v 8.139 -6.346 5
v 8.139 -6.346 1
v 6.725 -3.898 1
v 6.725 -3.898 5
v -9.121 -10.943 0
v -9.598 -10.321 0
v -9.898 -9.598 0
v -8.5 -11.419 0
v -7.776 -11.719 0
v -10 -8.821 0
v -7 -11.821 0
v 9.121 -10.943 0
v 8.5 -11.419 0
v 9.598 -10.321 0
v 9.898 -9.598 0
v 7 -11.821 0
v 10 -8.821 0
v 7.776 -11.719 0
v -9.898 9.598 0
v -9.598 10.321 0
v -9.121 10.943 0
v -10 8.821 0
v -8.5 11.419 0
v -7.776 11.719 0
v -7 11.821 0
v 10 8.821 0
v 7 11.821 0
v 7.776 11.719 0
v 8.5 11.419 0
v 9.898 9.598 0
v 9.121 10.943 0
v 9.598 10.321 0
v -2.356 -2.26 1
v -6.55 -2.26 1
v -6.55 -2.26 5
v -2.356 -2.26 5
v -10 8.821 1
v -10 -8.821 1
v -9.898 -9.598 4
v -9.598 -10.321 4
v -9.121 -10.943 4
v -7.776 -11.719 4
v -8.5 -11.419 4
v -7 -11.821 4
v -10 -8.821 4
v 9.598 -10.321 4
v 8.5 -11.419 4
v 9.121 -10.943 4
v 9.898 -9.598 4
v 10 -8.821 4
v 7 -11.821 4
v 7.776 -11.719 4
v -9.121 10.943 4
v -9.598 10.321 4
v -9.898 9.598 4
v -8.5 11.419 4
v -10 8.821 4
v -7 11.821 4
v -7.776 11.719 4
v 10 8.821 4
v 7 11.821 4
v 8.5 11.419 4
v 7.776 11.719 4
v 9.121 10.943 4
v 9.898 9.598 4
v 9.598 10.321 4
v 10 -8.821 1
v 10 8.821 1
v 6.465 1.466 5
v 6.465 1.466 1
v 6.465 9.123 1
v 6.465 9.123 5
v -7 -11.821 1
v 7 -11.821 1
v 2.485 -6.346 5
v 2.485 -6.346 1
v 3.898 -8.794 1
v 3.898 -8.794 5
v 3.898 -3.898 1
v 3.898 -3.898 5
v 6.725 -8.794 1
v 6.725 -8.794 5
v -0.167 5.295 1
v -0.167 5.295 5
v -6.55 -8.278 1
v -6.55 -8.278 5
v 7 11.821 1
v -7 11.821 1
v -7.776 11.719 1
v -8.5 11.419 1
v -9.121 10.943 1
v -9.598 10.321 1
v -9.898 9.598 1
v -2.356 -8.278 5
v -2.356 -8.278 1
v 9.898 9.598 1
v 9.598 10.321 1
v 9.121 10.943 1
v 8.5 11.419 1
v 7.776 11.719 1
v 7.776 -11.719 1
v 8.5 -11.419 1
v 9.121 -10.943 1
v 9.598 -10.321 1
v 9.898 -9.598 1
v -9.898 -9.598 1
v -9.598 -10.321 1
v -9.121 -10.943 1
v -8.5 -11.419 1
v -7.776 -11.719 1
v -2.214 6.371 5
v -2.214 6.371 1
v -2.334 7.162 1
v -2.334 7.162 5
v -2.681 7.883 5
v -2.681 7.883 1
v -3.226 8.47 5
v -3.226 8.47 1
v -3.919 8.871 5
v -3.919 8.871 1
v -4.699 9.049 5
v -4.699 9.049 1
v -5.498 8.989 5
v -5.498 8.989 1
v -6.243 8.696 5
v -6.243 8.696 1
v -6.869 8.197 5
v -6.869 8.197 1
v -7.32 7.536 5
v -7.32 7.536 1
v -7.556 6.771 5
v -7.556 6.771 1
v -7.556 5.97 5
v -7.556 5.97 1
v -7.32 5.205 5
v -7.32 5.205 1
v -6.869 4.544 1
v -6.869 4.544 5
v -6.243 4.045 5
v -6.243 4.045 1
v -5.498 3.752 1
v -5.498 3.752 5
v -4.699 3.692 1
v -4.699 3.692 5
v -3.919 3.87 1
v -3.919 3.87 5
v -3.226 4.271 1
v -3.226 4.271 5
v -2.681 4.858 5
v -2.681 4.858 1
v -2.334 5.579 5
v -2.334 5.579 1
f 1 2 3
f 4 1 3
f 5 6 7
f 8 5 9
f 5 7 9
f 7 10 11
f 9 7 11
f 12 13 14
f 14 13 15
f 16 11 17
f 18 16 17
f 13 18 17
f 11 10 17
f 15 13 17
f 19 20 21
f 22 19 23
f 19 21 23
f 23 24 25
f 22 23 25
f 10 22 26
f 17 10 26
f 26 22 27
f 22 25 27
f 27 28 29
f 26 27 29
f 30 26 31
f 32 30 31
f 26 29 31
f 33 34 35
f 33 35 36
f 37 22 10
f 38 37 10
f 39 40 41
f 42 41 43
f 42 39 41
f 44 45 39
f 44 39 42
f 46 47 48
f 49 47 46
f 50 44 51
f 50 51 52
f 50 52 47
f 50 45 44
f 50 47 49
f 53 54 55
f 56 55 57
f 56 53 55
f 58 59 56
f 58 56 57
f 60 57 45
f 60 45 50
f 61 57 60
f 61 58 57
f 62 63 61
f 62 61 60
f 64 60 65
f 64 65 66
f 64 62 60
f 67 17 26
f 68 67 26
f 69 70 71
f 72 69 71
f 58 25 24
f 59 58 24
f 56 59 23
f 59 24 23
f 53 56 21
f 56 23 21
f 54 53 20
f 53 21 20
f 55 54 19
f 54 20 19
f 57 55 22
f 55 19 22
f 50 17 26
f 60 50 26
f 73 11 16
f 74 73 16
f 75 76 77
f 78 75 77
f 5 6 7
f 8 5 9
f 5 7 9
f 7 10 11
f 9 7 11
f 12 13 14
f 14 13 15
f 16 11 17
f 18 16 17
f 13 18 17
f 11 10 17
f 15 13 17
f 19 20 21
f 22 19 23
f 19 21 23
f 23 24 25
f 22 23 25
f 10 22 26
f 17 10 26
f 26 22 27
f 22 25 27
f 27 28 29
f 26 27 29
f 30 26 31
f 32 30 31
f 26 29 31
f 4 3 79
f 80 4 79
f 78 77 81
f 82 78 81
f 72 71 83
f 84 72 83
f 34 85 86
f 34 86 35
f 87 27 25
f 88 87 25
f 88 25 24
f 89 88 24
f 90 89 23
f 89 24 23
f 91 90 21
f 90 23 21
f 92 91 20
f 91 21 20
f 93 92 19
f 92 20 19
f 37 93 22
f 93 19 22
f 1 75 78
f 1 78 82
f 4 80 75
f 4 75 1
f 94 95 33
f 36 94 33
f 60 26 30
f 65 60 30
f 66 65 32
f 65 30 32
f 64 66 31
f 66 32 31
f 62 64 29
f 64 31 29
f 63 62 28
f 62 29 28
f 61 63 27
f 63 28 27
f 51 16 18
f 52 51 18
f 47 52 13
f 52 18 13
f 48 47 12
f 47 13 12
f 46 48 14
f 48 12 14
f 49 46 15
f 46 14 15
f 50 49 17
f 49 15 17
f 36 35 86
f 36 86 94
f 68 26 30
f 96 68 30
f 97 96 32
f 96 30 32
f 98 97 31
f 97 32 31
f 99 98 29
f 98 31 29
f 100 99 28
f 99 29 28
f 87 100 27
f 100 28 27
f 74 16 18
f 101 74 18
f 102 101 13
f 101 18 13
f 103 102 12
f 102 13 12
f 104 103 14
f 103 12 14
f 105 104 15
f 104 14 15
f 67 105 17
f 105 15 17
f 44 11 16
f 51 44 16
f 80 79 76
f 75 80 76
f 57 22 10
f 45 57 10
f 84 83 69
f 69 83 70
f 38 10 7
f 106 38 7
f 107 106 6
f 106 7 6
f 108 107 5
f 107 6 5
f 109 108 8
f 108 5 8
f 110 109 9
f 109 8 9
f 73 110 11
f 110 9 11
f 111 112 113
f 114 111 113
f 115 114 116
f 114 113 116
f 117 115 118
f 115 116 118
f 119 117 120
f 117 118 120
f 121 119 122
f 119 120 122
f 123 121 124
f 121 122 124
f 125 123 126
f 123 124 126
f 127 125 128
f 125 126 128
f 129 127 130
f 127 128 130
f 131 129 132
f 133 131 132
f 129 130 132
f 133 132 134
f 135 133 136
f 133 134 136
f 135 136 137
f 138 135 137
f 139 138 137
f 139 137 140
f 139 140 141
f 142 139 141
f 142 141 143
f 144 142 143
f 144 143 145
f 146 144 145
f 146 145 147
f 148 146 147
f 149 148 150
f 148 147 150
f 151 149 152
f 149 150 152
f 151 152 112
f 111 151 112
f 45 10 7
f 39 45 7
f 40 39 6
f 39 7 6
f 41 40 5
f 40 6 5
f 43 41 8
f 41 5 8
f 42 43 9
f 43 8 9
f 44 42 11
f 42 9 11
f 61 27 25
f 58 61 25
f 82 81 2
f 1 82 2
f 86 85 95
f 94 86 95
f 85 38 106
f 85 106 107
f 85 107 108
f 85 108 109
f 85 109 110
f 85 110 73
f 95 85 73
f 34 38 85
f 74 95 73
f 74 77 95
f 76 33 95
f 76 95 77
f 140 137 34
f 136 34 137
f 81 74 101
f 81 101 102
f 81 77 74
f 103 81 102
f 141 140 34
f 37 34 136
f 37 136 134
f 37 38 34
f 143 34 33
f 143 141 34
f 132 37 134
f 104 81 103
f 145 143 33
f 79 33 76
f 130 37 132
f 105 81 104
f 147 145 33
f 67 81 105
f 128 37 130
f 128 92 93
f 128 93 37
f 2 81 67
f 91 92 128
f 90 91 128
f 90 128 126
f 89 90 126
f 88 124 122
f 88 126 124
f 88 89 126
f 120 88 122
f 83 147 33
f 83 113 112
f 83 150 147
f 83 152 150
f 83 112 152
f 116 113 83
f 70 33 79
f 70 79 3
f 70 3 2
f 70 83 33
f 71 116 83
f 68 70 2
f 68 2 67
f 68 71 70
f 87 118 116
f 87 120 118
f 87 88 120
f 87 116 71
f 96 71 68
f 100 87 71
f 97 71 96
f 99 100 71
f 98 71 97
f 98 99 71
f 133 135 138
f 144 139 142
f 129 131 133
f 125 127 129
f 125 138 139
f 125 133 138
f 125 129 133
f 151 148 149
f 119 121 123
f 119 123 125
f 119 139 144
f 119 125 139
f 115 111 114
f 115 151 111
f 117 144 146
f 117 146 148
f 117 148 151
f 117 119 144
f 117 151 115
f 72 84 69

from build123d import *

# Parameters (mm, degrees)
F1_DEPTH = 1
F2_R     = 2.685678
F2_W     = 4.193648
F2_H     = 6.018553
F3_DEPTH = 4
F4_DEPTH = 4


with BuildPart() as f1:
    # F0 (on Top) → F1 (new body)
    with BuildSketch(Plane.XY):
        with BuildLine():
            Line((-7, -11.821264), (7, -11.821264))
            ThreePointArc((7, -11.821264), (9.12132, -10.942585), (10, -8.821264))
            Line((10, -8.821264), (10, 8.821264))
            ThreePointArc((10, 8.821264), (9.12132, 10.942585), (7, 11.821264))
            Line((7, 11.821264), (-7, 11.821264))
            ThreePointArc((-7, 11.821264), (-9.12132, 10.942585), (-10, 8.821264))
            Line((-10, 8.821264), (-10, -8.821264))
            ThreePointArc((-10, -8.821264), (-9.12132, -10.942585), (-7, -11.821264))
        make_face()
    extrude(amount=F1_DEPTH)

    # F2 (on face) → F3 (join)
    with BuildSketch(Plane.XY.offset(1)):
        with Locations((-4.900075, 6.37052)):
            Circle(F2_R)
        with Locations((-4.453282, -5.26884)):
            Rectangle(F2_W, F2_H)
        Polygon((6.725439, -3.897795), (3.898383, -3.897795), (2.484856, -6.346097), (3.898383, -8.794399), (6.725439, -8.794399), (8.138966, -6.346097), align=None)
        Polygon((6.464704, 1.465722), (6.464704, 9.123345), (-0.166992, 5.294533), align=None)
    extrude(amount=F3_DEPTH)


with BuildPart() as f4:
    # F0 (on Top) → F4 (new body)
    with BuildSketch(Plane.XY):
        with BuildLine():
            Line((-7, -11.821264), (7, -11.821264))
            ThreePointArc((7, -11.821264), (9.12132, -10.942585), (10, -8.821264))
            Line((10, -8.821264), (10, 8.821264))
            ThreePointArc((10, 8.821264), (9.12132, 10.942585), (7, 11.821264))
            Line((7, 11.821264), (-7, 11.821264))
            ThreePointArc((-7, 11.821264), (-9.12132, 10.942585), (-10, 8.821264))
            Line((-10, 8.821264), (-10, -8.821264))
            ThreePointArc((-10, -8.821264), (-9.12132, -10.942585), (-7, -11.821264))
        make_face()
    extrude(amount=F4_DEPTH)


solid = Compound([f1.part, f4.part])
